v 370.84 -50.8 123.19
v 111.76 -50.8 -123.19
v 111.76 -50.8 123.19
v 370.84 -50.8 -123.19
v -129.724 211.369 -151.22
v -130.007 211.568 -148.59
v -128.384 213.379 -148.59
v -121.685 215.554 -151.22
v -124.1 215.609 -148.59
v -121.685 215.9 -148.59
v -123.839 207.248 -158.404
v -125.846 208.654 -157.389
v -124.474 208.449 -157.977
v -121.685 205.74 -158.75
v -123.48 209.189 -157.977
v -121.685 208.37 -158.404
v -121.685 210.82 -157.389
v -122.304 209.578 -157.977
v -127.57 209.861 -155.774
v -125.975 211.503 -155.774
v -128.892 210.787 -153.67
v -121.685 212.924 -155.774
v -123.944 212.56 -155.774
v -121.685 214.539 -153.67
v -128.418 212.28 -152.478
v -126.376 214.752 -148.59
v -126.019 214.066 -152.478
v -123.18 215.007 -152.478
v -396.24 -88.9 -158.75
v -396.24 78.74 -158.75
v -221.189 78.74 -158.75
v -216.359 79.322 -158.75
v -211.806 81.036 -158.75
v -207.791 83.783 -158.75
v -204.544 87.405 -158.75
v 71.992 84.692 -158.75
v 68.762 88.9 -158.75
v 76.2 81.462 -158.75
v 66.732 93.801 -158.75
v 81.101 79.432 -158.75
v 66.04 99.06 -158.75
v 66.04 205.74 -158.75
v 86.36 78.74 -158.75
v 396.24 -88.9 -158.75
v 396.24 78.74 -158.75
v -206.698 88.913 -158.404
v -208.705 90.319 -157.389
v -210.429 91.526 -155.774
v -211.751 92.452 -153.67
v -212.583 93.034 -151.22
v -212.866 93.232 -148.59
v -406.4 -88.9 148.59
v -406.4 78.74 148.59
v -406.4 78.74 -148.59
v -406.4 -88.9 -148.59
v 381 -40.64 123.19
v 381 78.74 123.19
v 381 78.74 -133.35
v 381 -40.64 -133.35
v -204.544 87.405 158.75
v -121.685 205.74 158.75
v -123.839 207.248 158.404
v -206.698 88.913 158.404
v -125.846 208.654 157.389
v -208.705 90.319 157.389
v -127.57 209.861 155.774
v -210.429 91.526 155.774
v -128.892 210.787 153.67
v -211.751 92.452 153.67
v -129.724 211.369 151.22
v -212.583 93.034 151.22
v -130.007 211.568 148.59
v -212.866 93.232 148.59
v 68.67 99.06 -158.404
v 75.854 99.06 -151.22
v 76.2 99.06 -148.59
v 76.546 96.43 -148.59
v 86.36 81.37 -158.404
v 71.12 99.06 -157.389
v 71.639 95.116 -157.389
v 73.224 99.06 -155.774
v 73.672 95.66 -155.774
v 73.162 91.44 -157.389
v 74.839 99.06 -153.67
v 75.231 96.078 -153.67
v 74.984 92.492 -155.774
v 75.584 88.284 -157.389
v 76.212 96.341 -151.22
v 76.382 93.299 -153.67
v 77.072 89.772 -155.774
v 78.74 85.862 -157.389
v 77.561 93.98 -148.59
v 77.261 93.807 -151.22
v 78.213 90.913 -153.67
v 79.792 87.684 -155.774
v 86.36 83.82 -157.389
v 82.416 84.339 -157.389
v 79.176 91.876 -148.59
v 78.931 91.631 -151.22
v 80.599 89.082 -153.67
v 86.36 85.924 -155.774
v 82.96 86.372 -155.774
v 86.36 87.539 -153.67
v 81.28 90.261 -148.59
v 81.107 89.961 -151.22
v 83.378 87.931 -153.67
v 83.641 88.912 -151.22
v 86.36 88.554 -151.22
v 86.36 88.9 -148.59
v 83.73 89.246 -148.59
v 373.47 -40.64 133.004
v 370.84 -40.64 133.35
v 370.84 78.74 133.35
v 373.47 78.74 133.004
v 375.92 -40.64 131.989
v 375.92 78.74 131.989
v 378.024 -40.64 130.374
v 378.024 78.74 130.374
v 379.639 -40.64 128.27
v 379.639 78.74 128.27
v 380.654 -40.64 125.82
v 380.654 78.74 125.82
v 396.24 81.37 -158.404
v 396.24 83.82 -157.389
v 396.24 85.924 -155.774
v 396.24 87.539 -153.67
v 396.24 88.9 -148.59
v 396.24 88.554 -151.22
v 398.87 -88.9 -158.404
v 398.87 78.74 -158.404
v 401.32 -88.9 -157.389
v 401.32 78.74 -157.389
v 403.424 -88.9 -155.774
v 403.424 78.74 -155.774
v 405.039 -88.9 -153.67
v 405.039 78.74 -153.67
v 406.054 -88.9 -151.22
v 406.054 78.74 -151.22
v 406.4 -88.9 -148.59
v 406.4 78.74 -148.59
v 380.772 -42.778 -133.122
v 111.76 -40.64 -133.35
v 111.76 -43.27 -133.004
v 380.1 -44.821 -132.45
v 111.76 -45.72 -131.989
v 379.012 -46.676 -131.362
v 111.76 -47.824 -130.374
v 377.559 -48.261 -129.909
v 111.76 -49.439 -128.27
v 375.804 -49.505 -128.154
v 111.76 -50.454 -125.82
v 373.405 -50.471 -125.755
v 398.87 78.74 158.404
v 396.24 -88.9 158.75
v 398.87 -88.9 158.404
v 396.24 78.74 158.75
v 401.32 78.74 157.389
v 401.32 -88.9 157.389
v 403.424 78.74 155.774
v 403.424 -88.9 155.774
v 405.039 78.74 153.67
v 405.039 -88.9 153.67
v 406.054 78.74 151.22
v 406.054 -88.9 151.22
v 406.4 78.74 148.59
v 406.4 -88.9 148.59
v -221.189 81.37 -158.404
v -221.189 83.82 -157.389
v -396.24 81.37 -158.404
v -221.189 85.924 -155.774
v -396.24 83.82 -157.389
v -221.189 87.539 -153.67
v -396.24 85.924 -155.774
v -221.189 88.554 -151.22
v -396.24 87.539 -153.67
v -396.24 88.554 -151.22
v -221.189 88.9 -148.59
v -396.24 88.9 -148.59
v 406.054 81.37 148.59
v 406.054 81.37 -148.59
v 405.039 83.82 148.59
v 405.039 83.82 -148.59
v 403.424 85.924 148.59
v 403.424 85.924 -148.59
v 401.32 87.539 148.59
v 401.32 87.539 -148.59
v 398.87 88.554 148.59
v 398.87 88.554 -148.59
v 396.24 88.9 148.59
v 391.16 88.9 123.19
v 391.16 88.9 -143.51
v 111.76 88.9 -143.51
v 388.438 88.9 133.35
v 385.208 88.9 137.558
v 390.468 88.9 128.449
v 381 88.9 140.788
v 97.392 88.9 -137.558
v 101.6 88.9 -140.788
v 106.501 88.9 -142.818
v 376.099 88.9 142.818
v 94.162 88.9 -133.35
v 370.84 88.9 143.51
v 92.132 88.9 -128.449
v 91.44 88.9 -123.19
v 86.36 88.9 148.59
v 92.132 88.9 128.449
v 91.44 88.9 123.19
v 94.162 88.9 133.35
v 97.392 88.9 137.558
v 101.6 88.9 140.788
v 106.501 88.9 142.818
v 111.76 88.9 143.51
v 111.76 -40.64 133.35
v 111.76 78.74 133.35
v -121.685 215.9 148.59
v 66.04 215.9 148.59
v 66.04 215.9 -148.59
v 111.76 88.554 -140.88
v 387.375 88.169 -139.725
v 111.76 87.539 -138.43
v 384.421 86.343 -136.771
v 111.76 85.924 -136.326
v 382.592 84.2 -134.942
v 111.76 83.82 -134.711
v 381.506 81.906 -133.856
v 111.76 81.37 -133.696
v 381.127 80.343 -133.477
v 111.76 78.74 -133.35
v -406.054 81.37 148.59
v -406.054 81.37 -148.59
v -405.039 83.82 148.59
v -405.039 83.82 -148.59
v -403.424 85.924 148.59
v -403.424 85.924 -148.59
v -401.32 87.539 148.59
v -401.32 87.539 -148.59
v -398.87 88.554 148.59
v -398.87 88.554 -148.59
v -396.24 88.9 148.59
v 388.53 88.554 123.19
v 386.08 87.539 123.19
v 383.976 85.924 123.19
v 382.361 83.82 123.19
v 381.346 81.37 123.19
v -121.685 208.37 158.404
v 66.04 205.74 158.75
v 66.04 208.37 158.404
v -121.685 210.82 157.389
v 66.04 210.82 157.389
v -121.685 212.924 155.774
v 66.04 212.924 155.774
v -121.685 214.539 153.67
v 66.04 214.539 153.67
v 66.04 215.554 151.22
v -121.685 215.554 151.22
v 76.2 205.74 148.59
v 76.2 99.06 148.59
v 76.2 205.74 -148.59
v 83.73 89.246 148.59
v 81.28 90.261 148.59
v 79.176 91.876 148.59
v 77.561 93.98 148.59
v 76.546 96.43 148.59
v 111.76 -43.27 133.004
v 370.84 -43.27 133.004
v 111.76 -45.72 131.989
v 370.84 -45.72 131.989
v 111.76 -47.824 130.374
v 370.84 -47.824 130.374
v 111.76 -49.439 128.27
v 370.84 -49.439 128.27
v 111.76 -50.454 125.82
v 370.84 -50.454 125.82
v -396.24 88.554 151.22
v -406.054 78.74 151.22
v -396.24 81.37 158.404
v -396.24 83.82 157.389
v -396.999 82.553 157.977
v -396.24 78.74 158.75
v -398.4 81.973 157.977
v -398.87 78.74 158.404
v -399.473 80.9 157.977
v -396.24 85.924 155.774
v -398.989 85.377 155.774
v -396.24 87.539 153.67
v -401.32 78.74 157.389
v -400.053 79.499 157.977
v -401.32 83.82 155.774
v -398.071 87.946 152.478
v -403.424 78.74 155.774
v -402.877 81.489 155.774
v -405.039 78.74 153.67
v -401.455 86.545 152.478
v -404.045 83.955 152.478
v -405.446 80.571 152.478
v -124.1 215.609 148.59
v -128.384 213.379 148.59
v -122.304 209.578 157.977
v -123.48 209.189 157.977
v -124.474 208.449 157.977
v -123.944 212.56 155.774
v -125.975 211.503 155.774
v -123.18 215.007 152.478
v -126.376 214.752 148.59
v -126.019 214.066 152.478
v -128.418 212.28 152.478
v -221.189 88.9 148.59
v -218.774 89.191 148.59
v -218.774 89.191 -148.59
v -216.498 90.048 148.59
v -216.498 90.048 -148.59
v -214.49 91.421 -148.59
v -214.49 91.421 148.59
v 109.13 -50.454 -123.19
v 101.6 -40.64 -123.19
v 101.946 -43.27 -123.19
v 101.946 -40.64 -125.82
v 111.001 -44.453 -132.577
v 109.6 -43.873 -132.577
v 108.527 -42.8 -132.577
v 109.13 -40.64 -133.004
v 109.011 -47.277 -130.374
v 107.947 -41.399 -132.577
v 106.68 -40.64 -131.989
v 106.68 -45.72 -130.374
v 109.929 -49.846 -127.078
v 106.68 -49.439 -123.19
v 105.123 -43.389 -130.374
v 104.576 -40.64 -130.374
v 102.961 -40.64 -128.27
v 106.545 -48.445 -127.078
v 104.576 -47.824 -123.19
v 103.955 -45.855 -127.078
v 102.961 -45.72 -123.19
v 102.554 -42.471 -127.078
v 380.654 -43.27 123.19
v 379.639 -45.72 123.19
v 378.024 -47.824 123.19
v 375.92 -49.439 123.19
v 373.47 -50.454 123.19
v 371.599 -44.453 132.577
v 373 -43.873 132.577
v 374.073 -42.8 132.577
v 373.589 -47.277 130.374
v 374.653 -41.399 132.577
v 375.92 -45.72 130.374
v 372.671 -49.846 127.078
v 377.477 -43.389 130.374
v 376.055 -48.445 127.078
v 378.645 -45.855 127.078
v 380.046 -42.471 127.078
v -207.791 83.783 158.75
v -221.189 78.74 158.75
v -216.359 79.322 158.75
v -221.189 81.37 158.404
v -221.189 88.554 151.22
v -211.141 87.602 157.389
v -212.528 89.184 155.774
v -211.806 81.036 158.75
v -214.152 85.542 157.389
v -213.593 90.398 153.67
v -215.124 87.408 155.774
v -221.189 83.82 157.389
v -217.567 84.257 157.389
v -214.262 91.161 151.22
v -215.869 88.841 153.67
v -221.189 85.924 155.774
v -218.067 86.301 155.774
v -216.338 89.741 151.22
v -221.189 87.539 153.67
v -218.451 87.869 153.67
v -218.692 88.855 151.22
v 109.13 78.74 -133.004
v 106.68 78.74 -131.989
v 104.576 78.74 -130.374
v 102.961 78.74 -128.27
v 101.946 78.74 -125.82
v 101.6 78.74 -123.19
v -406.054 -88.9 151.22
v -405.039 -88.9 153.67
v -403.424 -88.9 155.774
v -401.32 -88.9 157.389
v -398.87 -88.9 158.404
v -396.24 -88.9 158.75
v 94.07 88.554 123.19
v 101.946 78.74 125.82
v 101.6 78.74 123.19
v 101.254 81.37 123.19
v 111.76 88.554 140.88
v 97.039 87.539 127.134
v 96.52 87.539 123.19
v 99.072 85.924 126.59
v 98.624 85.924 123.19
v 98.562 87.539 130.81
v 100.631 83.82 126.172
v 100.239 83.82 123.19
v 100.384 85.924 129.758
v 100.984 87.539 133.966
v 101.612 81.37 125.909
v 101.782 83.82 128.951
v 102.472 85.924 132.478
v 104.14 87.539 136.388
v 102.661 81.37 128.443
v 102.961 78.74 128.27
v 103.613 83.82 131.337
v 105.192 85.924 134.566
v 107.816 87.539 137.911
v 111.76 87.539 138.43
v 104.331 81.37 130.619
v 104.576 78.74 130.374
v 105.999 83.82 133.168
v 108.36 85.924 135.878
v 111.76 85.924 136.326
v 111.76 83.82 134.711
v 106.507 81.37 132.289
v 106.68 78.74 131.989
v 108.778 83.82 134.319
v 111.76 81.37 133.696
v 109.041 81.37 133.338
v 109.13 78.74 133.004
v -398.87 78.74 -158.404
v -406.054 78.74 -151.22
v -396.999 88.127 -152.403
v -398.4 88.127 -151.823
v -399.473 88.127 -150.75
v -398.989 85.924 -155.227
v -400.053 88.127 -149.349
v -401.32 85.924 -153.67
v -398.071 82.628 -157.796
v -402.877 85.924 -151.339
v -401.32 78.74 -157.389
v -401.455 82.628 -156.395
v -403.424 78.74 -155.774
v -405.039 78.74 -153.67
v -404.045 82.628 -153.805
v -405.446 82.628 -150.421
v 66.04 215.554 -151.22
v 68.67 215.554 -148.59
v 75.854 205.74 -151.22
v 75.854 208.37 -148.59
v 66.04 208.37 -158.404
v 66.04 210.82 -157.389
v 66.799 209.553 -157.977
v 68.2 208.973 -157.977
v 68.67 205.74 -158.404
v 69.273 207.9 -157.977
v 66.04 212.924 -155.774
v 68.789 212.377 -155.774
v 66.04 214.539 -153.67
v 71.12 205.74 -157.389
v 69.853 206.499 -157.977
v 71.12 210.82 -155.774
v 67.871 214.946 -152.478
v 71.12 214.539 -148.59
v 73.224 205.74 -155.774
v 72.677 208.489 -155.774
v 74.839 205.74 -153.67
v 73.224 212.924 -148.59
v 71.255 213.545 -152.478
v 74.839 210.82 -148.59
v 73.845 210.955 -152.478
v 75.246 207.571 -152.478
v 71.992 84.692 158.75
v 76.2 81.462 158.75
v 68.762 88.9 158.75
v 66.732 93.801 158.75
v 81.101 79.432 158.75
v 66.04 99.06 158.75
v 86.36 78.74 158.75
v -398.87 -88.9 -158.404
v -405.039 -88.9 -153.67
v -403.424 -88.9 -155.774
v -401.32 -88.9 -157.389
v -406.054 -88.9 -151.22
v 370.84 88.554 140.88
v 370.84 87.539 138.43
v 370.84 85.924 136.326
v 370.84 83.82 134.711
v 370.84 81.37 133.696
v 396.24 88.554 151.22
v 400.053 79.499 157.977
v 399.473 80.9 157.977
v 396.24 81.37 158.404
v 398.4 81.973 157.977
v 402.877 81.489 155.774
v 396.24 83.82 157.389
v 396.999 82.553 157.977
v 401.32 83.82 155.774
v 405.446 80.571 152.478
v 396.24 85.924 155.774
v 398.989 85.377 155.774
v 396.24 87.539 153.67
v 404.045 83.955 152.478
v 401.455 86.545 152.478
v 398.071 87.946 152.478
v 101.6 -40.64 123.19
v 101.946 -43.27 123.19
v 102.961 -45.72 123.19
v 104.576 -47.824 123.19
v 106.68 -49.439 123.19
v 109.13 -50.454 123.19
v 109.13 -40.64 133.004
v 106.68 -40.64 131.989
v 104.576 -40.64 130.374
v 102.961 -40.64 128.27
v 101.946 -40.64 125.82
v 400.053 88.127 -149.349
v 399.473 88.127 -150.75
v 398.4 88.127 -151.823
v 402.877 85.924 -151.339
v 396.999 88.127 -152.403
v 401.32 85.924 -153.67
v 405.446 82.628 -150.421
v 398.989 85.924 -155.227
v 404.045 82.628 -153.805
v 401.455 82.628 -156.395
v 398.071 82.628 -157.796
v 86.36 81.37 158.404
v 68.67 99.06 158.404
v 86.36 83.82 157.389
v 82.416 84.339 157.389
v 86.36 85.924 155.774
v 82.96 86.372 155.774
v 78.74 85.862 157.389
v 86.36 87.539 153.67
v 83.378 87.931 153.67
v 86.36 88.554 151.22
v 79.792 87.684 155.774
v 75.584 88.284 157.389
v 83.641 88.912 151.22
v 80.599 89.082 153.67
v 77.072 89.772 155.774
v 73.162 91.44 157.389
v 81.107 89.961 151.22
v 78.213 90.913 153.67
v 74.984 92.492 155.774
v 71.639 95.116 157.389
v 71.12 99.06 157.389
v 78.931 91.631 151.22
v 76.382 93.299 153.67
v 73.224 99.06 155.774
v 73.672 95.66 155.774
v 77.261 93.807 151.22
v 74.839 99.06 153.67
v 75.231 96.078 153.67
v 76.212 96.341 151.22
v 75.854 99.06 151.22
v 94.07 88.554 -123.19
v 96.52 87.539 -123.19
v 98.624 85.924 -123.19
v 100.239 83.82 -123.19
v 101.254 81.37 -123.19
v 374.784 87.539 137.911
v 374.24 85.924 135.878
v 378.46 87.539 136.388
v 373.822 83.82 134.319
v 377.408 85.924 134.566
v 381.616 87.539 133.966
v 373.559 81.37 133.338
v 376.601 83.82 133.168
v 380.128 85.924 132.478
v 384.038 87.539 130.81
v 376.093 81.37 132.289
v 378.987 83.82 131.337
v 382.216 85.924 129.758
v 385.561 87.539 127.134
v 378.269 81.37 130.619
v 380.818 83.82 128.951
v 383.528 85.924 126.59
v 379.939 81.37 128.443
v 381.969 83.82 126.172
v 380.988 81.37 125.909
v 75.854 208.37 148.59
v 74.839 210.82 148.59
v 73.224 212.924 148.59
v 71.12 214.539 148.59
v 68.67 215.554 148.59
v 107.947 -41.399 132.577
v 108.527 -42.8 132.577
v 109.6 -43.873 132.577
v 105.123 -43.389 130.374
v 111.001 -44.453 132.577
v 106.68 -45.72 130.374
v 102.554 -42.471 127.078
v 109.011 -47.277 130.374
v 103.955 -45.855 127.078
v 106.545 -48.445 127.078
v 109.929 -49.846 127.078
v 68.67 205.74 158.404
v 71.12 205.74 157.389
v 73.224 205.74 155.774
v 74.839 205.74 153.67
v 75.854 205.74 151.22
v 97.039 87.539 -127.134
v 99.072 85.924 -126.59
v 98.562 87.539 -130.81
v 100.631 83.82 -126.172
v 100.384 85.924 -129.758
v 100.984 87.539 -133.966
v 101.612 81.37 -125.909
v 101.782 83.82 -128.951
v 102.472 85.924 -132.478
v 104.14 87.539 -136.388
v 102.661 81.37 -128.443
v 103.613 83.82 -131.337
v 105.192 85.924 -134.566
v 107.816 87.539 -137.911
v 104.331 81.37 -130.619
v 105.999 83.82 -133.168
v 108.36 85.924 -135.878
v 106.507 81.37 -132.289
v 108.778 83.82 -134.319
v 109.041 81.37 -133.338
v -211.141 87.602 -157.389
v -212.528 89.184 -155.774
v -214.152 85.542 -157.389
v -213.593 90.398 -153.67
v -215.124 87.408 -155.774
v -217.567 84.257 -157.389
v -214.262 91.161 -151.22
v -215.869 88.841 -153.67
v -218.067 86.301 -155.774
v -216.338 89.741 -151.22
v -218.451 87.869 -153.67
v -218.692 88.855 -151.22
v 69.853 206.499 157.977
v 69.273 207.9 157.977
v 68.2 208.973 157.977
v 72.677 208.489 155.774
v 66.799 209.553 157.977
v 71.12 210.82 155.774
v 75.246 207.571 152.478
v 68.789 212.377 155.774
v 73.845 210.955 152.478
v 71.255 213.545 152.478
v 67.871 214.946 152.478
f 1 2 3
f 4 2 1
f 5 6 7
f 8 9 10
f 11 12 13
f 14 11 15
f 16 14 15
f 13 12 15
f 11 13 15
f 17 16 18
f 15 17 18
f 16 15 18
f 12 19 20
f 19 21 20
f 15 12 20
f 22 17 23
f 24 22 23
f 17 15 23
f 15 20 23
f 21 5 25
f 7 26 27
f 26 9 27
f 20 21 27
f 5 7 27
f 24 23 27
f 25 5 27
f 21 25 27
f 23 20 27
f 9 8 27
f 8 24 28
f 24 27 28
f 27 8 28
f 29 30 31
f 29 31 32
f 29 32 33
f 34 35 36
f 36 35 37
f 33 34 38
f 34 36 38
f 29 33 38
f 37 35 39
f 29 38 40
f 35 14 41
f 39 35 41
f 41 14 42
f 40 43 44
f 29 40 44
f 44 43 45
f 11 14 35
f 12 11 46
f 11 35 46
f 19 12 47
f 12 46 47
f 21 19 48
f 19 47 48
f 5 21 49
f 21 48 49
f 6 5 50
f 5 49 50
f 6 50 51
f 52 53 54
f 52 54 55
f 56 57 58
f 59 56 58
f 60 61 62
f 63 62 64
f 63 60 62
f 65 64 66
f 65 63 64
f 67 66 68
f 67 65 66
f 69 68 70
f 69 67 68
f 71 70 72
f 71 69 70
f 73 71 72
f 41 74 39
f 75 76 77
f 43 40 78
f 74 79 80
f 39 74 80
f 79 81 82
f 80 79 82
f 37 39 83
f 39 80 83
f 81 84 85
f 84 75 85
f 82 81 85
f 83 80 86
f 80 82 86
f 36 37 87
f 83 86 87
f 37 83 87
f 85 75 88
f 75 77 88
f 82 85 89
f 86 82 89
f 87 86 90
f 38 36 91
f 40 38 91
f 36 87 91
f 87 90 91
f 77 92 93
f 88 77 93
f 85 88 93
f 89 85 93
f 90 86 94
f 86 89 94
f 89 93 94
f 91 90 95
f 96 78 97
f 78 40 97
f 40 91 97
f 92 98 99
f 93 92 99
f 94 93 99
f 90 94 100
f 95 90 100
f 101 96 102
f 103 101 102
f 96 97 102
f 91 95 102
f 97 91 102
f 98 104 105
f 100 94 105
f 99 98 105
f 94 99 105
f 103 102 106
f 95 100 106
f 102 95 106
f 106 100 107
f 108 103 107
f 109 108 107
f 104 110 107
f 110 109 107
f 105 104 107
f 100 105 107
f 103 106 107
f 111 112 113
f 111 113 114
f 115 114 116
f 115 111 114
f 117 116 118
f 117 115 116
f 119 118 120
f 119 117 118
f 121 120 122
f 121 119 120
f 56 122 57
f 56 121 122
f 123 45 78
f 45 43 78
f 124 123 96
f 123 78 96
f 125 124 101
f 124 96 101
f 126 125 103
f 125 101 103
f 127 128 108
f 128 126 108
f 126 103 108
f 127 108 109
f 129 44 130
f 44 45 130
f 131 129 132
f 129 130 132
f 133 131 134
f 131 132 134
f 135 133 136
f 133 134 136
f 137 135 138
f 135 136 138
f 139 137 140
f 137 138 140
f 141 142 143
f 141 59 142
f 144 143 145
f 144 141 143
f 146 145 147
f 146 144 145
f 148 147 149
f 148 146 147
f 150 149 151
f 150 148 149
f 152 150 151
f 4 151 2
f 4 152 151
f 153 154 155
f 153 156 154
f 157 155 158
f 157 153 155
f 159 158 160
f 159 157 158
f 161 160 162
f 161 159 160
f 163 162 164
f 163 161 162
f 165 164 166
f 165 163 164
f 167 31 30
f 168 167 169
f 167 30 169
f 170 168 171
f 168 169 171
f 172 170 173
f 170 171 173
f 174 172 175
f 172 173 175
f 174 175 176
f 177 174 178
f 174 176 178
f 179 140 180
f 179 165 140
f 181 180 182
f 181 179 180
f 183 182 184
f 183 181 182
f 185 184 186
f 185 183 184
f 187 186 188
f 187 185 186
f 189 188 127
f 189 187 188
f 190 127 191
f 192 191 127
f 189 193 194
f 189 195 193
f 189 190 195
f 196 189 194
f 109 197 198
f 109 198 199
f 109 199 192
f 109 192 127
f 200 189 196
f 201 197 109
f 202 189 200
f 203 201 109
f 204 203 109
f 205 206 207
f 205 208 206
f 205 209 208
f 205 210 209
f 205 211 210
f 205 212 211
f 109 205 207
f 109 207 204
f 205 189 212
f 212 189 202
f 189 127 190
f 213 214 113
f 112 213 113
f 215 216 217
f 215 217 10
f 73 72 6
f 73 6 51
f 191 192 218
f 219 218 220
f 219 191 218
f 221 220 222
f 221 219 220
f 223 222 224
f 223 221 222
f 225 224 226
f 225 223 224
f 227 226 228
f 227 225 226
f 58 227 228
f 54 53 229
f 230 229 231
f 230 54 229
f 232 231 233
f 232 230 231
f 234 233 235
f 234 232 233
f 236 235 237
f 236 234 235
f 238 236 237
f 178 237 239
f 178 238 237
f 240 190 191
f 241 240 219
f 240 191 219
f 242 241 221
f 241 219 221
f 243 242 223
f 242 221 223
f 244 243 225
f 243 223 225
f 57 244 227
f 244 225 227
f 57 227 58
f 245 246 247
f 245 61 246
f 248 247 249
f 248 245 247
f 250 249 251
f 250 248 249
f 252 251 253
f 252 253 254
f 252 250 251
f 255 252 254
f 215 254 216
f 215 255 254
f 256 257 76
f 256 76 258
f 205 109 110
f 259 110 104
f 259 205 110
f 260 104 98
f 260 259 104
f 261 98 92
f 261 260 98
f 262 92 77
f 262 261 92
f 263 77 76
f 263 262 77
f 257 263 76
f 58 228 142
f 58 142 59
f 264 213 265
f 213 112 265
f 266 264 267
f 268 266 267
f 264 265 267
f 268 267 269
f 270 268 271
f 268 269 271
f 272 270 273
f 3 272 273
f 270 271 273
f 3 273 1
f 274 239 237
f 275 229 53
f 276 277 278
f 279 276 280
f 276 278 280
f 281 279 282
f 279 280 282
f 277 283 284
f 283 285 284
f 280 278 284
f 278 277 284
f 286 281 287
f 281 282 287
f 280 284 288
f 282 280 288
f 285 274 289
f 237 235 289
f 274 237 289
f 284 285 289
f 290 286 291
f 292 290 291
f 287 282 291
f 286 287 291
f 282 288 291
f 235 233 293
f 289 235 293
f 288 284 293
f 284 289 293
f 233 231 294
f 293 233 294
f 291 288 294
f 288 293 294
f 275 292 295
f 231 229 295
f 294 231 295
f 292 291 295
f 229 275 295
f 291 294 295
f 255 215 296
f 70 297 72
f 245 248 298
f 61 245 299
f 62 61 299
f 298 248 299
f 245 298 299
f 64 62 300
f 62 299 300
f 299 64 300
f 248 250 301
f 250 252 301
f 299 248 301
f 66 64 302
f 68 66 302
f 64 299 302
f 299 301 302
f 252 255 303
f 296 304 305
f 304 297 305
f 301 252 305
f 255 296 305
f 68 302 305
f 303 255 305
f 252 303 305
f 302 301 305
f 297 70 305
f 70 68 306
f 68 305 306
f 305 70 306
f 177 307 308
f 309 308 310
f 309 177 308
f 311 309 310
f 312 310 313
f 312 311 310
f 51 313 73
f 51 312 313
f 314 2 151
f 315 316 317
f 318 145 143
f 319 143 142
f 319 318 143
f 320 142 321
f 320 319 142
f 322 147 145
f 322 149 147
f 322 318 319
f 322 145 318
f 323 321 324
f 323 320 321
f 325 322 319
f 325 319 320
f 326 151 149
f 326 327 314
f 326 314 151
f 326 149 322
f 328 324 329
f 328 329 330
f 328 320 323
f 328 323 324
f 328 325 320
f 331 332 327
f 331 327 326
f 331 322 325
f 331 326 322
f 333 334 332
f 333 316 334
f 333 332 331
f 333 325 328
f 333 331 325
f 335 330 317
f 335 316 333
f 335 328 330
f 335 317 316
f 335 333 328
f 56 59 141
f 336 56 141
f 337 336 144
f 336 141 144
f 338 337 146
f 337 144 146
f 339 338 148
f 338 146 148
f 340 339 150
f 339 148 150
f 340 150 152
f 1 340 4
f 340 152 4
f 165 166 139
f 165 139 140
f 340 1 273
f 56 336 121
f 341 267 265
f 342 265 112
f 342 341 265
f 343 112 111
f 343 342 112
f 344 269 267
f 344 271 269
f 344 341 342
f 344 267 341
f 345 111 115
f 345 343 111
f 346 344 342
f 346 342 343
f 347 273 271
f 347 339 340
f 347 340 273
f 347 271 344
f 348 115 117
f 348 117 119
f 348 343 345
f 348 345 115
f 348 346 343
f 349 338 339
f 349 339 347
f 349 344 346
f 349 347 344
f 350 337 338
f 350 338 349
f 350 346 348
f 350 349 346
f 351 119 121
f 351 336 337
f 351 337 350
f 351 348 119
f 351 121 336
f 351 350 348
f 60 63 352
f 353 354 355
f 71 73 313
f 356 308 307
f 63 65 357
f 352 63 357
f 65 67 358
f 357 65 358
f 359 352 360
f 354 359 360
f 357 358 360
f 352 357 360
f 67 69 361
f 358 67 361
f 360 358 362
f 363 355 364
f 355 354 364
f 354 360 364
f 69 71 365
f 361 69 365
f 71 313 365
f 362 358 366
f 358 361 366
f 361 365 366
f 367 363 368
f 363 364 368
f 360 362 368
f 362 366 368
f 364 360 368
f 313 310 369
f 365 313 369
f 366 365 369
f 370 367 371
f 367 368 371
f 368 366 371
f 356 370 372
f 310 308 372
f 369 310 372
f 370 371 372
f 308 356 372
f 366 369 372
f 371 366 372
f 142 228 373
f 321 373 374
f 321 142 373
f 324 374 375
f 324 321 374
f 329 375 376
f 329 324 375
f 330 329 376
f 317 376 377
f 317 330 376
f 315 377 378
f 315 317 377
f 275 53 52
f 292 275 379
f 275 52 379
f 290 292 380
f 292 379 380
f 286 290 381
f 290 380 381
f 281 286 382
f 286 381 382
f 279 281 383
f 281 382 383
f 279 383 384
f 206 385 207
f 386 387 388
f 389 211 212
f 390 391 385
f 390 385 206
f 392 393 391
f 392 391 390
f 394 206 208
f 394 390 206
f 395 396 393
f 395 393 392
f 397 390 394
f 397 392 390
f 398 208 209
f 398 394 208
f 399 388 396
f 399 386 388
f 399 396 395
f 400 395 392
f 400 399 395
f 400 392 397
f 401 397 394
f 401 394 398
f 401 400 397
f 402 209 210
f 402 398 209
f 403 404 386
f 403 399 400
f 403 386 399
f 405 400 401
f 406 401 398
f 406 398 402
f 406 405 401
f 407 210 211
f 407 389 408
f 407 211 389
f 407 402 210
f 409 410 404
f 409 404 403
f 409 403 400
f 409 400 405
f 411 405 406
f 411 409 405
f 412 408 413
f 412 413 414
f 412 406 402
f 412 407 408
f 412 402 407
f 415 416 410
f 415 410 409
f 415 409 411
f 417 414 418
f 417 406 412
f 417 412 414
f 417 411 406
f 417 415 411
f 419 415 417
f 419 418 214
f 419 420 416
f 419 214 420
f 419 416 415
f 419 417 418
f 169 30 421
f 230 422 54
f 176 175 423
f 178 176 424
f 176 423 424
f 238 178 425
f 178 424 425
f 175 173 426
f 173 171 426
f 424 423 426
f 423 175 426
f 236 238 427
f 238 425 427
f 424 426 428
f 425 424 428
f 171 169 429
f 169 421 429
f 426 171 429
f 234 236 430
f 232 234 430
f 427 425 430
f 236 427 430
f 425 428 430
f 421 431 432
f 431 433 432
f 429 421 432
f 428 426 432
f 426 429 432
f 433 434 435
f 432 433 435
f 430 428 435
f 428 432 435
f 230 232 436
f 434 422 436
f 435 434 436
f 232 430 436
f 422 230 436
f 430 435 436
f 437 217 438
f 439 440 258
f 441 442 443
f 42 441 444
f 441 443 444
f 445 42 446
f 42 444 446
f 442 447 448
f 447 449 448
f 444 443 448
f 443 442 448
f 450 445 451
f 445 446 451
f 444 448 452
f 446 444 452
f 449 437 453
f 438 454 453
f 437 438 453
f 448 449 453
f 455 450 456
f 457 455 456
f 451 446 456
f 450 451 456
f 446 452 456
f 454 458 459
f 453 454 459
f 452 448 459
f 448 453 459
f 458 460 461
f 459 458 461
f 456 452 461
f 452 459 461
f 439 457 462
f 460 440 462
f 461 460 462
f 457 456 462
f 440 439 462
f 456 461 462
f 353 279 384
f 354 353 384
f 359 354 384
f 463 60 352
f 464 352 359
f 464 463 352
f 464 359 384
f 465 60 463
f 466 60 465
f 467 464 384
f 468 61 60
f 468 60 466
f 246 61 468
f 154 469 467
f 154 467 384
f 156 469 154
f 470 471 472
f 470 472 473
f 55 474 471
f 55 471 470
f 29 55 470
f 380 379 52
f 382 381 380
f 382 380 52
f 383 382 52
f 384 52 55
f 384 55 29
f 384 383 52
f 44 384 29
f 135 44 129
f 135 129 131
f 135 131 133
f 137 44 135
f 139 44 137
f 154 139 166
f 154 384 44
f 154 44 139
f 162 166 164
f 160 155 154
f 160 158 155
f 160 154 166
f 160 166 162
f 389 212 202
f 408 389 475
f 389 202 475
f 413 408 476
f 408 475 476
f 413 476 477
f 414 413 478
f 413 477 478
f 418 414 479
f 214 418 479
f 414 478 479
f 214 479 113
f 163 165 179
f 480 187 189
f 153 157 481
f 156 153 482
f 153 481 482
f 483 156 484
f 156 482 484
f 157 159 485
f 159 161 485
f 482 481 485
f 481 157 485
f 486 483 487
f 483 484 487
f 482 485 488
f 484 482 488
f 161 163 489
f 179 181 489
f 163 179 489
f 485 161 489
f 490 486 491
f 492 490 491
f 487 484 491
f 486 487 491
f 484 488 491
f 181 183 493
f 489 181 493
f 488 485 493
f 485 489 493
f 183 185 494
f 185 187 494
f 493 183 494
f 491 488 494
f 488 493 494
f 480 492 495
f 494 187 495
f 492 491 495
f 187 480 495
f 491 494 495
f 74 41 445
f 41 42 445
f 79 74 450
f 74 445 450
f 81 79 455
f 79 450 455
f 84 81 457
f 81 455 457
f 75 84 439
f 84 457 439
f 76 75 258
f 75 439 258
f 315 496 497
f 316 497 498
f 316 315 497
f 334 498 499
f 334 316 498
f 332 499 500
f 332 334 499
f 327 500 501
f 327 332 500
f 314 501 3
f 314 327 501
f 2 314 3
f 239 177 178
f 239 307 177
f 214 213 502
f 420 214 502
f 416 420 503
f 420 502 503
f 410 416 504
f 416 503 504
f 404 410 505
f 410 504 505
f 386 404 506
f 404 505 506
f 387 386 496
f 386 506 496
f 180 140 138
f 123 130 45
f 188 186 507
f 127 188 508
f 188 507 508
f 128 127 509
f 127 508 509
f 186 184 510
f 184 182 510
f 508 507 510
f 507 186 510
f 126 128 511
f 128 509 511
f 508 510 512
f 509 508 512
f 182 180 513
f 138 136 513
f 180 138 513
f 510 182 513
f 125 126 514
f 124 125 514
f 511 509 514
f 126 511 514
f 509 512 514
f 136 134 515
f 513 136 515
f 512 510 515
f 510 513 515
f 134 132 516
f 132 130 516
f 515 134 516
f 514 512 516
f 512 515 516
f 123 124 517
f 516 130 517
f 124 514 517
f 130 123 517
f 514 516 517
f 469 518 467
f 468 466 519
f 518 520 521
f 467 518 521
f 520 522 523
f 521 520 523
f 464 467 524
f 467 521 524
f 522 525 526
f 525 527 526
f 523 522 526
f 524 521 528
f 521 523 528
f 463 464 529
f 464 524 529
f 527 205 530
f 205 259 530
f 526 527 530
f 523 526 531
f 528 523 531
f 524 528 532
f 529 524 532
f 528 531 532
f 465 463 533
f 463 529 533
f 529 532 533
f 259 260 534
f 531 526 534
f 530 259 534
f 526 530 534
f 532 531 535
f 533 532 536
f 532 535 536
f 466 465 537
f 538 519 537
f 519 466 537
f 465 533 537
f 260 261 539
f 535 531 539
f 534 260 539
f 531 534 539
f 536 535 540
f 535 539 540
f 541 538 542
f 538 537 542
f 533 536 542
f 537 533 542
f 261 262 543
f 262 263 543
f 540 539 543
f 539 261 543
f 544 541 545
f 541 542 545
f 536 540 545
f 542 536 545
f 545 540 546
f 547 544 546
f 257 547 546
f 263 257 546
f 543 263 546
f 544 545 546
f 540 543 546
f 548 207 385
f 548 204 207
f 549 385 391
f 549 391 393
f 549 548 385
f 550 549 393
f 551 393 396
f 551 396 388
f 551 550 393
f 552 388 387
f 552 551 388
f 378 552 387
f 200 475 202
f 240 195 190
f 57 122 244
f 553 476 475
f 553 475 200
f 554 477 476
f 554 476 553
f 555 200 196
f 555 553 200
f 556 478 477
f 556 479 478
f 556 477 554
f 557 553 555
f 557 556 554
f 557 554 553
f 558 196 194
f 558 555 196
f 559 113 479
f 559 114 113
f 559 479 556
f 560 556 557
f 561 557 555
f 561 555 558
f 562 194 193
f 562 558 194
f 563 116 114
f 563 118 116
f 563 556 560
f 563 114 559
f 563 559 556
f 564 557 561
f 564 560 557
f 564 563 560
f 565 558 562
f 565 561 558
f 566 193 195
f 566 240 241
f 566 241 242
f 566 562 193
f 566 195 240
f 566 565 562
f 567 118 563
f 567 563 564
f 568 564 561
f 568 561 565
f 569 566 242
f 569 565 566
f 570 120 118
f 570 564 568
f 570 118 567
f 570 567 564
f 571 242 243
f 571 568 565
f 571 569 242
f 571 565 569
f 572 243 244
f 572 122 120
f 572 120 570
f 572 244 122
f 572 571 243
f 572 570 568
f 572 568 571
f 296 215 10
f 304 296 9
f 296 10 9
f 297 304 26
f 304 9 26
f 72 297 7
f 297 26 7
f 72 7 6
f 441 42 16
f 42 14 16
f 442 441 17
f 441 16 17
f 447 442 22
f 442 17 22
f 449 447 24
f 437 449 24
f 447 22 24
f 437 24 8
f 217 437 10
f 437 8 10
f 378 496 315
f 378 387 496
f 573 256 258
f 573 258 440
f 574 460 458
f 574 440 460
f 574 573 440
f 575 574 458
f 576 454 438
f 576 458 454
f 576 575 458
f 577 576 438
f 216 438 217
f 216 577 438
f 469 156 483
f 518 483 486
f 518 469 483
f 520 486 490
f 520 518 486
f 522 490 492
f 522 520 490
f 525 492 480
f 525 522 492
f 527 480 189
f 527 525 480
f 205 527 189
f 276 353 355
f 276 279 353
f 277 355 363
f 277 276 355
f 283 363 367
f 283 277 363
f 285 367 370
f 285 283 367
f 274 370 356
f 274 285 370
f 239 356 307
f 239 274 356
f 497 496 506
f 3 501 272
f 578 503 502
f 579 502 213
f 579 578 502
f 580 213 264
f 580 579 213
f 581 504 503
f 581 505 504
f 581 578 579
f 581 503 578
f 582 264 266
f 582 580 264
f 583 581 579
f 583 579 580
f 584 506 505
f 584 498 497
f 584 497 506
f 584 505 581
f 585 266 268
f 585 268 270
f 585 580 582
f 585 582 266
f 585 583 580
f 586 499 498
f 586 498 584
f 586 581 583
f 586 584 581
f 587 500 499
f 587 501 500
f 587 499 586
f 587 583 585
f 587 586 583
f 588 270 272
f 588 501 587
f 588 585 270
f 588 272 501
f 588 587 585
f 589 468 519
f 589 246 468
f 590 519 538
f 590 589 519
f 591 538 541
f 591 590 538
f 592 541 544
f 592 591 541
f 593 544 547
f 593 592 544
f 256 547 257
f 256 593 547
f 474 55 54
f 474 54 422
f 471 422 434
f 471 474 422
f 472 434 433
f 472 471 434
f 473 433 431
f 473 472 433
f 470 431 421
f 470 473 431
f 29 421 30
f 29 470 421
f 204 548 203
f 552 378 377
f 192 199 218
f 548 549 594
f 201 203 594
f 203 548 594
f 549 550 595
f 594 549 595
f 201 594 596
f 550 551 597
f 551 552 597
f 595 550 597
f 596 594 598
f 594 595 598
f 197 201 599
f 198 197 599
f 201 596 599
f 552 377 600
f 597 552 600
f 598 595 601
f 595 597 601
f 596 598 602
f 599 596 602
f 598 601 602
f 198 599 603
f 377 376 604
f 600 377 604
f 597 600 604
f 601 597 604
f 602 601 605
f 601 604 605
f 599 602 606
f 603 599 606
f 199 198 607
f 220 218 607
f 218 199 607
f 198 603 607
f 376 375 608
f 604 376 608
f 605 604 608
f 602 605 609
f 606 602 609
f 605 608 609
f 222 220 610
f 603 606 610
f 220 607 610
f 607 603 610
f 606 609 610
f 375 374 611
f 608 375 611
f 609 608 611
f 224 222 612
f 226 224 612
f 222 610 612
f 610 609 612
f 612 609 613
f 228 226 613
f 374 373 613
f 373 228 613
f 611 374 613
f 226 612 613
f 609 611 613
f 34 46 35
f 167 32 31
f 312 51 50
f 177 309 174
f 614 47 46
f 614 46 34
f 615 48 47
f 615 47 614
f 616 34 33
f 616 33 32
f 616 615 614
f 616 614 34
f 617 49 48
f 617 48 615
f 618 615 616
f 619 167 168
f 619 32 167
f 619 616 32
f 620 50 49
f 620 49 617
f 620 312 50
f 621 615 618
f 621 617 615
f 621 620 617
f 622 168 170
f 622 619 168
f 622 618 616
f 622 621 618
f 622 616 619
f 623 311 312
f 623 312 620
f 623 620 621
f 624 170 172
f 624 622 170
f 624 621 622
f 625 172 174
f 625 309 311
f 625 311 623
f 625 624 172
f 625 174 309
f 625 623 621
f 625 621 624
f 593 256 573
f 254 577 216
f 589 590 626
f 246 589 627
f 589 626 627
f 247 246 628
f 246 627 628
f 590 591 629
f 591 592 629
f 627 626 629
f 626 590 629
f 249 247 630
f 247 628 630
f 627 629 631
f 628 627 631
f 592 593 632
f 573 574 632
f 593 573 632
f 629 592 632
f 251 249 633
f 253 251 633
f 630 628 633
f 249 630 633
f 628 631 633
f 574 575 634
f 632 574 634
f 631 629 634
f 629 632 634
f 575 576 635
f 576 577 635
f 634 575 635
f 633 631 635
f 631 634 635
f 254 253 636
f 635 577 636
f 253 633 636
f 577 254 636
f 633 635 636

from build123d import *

# Parameters (mm, degrees)
BOSS_EXTRUDE1_DEPTH = 158.75
SKETCH2_W           = 279.4
SKETCH2_H           = 266.7
CUT_EXTRUDE1_DEPTH  = 139.7
FILLET1_R           = 10.16


with BuildPart() as part:
    # Sketch1 → Boss-Extrude1 (new, symmetric)
    with BuildSketch(Plane.XY):
        Polygon((-406.4, 88.9), (-406.4, -88.9), (406.4, -88.9), (406.4, 88.9), (76.2, 88.9), (76.2, 215.9), (-126.973642647, 215.9), (-215.9, 88.9), align=None)
    extrude(amount=BOSS_EXTRUDE1_DEPTH, both=True)

    # Sketch2 → Cut-Extrude1 (cut)
    with BuildSketch(Plane(origin=(0, 88.9, 0), x_dir=(1, 0, 0), z_dir=(0, 1, 0))):
        with Locations((241.3, 0)):
            Rectangle(SKETCH2_W, SKETCH2_H)
    extrude(amount=-CUT_EXTRUDE1_DEPTH, mode=Mode.SUBTRACT)

    # Fillet1
    fillet1_edges = [part.edges().sort_by_distance(p)[0] for p in [
        (406.4, 0, -158.75),
        (-406.4, 0, -158.75),
        (-311.15, 88.9, -158.75),
        (-215.9, 88.9, 0),
        (-126.973642647, 215.9, 0),
        (76.2, 215.9, 0),
        (76.2, 88.9, 0),
        (406.4, 88.9, 0),
        (-406.4, 88.9, 0),
        (406.4, 0, 158.75),
        (241.3, 88.9, 158.75),
        (76.2, 152.4, 158.75),
        (101.6, -50.8, 0),
        (101.6, 19.05, 133.35),
        (241.3, -50.8, -133.35),
        (101.6, 19.05, -133.35),
        (381, -50.8, 0),
        (241.3, -50.8, 133.35),
        (-25.386821324, 215.9, 158.75),
        (381, 19.05, 133.35),
        (101.6, 88.9, 0),
        (241.3, 88.9, 133.35),
        (381, 88.9, 0),
        (241.3, 88.9, -133.35),
        (-171.436821324, 152.4, 158.75),
        (-311.15, 88.9, 158.75),
        (-171.436821324, 152.4, -158.75),
        (-406.4, 0, 158.75),
        (-25.386821324, 215.9, -158.75),
        (76.2, 152.4, -158.75),
        (241.3, 88.9, -158.75),
    ]]
    fillet(fillet1_edges, radius=FILLET1_R)


solid = part.part
